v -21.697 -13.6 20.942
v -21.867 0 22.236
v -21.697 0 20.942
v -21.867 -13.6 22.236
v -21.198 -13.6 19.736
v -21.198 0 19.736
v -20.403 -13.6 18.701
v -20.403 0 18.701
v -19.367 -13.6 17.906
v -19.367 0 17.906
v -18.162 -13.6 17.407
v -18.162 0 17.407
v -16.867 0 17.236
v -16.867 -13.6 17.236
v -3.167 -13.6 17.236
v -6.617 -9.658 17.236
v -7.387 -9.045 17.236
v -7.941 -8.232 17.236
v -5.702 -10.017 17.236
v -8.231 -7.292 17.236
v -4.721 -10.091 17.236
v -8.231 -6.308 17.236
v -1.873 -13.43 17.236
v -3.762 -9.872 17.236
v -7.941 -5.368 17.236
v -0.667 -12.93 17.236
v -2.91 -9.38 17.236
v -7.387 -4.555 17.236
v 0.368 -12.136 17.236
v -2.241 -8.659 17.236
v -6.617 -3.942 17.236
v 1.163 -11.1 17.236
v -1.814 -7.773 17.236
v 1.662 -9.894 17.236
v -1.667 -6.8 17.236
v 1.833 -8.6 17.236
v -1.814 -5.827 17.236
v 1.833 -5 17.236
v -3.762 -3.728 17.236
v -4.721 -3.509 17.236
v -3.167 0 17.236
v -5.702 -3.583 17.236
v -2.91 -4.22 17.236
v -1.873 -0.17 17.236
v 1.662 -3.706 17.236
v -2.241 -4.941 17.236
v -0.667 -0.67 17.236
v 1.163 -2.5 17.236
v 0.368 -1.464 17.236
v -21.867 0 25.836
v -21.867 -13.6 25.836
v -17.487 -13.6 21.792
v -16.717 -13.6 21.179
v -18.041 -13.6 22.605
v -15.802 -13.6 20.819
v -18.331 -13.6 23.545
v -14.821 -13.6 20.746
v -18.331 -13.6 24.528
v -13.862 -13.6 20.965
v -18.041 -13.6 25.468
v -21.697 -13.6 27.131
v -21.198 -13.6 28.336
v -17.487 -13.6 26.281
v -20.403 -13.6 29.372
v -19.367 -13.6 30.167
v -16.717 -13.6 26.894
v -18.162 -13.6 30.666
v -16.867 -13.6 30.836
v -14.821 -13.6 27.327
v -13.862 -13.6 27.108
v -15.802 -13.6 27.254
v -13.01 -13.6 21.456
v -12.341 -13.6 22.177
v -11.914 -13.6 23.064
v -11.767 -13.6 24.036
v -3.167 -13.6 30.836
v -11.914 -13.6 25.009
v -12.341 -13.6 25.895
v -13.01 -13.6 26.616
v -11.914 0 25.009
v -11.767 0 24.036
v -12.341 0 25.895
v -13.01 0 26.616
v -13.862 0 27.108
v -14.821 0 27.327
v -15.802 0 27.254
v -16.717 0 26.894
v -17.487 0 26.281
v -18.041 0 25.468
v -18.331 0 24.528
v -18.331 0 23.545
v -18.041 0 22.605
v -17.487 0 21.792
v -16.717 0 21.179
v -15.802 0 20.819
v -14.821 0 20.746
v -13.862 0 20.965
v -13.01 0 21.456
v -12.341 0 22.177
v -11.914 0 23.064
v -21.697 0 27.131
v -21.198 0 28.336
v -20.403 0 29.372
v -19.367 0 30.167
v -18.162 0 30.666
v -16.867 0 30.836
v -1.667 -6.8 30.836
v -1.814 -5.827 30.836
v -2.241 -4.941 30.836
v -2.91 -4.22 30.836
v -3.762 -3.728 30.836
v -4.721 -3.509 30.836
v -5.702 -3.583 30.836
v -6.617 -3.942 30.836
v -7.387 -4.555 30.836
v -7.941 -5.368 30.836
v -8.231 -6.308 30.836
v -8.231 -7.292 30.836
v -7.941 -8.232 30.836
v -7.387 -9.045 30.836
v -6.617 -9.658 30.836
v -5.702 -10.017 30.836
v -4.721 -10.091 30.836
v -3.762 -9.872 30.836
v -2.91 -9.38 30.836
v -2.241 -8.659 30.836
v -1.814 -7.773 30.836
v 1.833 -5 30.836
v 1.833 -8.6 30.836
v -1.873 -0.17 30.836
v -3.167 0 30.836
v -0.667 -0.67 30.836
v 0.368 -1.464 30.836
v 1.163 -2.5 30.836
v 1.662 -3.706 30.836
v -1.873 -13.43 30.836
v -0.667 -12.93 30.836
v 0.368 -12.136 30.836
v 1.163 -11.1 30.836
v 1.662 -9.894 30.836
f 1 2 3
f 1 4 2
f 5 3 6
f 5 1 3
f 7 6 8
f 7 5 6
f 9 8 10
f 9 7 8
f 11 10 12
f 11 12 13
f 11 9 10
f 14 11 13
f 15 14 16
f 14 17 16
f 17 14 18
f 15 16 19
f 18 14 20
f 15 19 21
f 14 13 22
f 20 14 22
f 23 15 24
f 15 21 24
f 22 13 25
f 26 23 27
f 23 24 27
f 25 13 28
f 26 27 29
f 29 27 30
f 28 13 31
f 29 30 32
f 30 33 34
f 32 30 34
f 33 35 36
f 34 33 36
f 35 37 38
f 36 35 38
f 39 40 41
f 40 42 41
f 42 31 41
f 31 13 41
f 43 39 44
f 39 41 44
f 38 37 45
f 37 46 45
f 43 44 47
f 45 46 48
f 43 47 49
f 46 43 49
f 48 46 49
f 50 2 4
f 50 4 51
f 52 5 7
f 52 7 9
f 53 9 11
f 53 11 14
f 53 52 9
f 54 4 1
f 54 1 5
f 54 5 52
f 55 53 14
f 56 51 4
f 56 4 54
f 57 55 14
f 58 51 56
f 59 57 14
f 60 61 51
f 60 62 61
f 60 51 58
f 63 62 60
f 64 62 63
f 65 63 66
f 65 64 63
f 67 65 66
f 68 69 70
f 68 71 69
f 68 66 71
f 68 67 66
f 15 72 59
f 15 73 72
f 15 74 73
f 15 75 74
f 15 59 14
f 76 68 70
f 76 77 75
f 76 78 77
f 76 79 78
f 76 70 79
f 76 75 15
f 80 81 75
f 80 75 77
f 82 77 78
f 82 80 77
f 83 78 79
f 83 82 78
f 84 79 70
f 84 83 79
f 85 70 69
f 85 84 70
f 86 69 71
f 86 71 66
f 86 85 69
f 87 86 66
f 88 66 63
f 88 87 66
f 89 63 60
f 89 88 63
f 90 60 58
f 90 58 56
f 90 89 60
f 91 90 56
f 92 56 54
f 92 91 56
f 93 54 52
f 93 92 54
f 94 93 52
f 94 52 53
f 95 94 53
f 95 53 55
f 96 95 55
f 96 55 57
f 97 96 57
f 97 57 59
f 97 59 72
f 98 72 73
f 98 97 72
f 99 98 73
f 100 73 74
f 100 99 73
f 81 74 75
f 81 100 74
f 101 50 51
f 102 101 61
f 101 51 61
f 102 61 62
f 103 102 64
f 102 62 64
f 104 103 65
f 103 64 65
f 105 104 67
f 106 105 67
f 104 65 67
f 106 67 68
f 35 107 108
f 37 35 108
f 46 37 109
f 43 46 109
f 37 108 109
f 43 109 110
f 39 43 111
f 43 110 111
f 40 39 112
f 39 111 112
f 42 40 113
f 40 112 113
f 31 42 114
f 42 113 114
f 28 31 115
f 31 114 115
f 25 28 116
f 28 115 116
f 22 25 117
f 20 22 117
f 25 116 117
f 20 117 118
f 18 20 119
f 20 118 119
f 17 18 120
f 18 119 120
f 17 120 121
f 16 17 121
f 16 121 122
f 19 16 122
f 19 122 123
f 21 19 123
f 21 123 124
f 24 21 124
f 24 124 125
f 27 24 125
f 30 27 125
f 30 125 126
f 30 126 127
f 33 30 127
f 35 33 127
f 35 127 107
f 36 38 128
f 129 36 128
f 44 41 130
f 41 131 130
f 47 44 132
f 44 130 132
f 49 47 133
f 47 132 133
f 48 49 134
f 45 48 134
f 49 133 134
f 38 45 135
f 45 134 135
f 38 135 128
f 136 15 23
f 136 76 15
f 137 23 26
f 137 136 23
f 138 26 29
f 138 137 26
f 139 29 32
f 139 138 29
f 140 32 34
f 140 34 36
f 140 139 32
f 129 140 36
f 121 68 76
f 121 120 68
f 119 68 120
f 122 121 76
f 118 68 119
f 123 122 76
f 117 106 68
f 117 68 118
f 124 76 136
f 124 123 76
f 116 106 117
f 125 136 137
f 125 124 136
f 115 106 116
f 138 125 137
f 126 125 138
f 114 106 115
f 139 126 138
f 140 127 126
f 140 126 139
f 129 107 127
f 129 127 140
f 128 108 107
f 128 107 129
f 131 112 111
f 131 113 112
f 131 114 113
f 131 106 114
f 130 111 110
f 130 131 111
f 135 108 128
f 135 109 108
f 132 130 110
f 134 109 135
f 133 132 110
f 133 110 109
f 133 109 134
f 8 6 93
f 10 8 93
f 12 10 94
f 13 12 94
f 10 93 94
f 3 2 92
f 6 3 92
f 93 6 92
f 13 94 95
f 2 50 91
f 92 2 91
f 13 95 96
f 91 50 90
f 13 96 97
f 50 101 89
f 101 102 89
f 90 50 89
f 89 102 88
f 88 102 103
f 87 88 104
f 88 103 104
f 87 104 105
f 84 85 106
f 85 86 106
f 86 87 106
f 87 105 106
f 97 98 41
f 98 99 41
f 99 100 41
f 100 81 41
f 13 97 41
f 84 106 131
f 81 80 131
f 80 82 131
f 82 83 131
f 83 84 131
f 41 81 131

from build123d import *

# Parameters (mm, degrees)
F0_W     = 23.7
F0_H     = 13.6
F0_R     = 3.3
F1_DEPTH = 13.6
F2_R     = 3.3
F3_DEPTH = 13.601
F4_R     = 5


with BuildPart() as f1:
    # F0 (on Front) → F1 (new body)
    with BuildSketch(Plane.XZ):
        with Locations((-10.017435, 24.03643)):
            Rectangle(F0_W, F0_H)
        with Locations((-15.067435, 24.03643)):
            Circle(F0_R, mode=Mode.SUBTRACT)
    extrude(amount=F1_DEPTH)

    # F2 (on face) → F3 (cut, through all)
    with BuildSketch(Plane.XY.offset(30.83643)):
        with Locations((-4.967435, -6.8)):
            Circle(F2_R)
    extrude(amount=-F3_DEPTH, mode=Mode.SUBTRACT)

    # F4
    f4_edges = [f1.edges().sort_by_distance(p)[0] for p in [
        (1.832565, -13.6, 24.03643),
        (1.832565, 0, 24.03643),
        (-21.867435, -6.8, 30.83643),
        (-21.867435, -6.8, 17.23643),
    ]]
    fillet(f4_edges, radius=F4_R)


solid = f1.part
